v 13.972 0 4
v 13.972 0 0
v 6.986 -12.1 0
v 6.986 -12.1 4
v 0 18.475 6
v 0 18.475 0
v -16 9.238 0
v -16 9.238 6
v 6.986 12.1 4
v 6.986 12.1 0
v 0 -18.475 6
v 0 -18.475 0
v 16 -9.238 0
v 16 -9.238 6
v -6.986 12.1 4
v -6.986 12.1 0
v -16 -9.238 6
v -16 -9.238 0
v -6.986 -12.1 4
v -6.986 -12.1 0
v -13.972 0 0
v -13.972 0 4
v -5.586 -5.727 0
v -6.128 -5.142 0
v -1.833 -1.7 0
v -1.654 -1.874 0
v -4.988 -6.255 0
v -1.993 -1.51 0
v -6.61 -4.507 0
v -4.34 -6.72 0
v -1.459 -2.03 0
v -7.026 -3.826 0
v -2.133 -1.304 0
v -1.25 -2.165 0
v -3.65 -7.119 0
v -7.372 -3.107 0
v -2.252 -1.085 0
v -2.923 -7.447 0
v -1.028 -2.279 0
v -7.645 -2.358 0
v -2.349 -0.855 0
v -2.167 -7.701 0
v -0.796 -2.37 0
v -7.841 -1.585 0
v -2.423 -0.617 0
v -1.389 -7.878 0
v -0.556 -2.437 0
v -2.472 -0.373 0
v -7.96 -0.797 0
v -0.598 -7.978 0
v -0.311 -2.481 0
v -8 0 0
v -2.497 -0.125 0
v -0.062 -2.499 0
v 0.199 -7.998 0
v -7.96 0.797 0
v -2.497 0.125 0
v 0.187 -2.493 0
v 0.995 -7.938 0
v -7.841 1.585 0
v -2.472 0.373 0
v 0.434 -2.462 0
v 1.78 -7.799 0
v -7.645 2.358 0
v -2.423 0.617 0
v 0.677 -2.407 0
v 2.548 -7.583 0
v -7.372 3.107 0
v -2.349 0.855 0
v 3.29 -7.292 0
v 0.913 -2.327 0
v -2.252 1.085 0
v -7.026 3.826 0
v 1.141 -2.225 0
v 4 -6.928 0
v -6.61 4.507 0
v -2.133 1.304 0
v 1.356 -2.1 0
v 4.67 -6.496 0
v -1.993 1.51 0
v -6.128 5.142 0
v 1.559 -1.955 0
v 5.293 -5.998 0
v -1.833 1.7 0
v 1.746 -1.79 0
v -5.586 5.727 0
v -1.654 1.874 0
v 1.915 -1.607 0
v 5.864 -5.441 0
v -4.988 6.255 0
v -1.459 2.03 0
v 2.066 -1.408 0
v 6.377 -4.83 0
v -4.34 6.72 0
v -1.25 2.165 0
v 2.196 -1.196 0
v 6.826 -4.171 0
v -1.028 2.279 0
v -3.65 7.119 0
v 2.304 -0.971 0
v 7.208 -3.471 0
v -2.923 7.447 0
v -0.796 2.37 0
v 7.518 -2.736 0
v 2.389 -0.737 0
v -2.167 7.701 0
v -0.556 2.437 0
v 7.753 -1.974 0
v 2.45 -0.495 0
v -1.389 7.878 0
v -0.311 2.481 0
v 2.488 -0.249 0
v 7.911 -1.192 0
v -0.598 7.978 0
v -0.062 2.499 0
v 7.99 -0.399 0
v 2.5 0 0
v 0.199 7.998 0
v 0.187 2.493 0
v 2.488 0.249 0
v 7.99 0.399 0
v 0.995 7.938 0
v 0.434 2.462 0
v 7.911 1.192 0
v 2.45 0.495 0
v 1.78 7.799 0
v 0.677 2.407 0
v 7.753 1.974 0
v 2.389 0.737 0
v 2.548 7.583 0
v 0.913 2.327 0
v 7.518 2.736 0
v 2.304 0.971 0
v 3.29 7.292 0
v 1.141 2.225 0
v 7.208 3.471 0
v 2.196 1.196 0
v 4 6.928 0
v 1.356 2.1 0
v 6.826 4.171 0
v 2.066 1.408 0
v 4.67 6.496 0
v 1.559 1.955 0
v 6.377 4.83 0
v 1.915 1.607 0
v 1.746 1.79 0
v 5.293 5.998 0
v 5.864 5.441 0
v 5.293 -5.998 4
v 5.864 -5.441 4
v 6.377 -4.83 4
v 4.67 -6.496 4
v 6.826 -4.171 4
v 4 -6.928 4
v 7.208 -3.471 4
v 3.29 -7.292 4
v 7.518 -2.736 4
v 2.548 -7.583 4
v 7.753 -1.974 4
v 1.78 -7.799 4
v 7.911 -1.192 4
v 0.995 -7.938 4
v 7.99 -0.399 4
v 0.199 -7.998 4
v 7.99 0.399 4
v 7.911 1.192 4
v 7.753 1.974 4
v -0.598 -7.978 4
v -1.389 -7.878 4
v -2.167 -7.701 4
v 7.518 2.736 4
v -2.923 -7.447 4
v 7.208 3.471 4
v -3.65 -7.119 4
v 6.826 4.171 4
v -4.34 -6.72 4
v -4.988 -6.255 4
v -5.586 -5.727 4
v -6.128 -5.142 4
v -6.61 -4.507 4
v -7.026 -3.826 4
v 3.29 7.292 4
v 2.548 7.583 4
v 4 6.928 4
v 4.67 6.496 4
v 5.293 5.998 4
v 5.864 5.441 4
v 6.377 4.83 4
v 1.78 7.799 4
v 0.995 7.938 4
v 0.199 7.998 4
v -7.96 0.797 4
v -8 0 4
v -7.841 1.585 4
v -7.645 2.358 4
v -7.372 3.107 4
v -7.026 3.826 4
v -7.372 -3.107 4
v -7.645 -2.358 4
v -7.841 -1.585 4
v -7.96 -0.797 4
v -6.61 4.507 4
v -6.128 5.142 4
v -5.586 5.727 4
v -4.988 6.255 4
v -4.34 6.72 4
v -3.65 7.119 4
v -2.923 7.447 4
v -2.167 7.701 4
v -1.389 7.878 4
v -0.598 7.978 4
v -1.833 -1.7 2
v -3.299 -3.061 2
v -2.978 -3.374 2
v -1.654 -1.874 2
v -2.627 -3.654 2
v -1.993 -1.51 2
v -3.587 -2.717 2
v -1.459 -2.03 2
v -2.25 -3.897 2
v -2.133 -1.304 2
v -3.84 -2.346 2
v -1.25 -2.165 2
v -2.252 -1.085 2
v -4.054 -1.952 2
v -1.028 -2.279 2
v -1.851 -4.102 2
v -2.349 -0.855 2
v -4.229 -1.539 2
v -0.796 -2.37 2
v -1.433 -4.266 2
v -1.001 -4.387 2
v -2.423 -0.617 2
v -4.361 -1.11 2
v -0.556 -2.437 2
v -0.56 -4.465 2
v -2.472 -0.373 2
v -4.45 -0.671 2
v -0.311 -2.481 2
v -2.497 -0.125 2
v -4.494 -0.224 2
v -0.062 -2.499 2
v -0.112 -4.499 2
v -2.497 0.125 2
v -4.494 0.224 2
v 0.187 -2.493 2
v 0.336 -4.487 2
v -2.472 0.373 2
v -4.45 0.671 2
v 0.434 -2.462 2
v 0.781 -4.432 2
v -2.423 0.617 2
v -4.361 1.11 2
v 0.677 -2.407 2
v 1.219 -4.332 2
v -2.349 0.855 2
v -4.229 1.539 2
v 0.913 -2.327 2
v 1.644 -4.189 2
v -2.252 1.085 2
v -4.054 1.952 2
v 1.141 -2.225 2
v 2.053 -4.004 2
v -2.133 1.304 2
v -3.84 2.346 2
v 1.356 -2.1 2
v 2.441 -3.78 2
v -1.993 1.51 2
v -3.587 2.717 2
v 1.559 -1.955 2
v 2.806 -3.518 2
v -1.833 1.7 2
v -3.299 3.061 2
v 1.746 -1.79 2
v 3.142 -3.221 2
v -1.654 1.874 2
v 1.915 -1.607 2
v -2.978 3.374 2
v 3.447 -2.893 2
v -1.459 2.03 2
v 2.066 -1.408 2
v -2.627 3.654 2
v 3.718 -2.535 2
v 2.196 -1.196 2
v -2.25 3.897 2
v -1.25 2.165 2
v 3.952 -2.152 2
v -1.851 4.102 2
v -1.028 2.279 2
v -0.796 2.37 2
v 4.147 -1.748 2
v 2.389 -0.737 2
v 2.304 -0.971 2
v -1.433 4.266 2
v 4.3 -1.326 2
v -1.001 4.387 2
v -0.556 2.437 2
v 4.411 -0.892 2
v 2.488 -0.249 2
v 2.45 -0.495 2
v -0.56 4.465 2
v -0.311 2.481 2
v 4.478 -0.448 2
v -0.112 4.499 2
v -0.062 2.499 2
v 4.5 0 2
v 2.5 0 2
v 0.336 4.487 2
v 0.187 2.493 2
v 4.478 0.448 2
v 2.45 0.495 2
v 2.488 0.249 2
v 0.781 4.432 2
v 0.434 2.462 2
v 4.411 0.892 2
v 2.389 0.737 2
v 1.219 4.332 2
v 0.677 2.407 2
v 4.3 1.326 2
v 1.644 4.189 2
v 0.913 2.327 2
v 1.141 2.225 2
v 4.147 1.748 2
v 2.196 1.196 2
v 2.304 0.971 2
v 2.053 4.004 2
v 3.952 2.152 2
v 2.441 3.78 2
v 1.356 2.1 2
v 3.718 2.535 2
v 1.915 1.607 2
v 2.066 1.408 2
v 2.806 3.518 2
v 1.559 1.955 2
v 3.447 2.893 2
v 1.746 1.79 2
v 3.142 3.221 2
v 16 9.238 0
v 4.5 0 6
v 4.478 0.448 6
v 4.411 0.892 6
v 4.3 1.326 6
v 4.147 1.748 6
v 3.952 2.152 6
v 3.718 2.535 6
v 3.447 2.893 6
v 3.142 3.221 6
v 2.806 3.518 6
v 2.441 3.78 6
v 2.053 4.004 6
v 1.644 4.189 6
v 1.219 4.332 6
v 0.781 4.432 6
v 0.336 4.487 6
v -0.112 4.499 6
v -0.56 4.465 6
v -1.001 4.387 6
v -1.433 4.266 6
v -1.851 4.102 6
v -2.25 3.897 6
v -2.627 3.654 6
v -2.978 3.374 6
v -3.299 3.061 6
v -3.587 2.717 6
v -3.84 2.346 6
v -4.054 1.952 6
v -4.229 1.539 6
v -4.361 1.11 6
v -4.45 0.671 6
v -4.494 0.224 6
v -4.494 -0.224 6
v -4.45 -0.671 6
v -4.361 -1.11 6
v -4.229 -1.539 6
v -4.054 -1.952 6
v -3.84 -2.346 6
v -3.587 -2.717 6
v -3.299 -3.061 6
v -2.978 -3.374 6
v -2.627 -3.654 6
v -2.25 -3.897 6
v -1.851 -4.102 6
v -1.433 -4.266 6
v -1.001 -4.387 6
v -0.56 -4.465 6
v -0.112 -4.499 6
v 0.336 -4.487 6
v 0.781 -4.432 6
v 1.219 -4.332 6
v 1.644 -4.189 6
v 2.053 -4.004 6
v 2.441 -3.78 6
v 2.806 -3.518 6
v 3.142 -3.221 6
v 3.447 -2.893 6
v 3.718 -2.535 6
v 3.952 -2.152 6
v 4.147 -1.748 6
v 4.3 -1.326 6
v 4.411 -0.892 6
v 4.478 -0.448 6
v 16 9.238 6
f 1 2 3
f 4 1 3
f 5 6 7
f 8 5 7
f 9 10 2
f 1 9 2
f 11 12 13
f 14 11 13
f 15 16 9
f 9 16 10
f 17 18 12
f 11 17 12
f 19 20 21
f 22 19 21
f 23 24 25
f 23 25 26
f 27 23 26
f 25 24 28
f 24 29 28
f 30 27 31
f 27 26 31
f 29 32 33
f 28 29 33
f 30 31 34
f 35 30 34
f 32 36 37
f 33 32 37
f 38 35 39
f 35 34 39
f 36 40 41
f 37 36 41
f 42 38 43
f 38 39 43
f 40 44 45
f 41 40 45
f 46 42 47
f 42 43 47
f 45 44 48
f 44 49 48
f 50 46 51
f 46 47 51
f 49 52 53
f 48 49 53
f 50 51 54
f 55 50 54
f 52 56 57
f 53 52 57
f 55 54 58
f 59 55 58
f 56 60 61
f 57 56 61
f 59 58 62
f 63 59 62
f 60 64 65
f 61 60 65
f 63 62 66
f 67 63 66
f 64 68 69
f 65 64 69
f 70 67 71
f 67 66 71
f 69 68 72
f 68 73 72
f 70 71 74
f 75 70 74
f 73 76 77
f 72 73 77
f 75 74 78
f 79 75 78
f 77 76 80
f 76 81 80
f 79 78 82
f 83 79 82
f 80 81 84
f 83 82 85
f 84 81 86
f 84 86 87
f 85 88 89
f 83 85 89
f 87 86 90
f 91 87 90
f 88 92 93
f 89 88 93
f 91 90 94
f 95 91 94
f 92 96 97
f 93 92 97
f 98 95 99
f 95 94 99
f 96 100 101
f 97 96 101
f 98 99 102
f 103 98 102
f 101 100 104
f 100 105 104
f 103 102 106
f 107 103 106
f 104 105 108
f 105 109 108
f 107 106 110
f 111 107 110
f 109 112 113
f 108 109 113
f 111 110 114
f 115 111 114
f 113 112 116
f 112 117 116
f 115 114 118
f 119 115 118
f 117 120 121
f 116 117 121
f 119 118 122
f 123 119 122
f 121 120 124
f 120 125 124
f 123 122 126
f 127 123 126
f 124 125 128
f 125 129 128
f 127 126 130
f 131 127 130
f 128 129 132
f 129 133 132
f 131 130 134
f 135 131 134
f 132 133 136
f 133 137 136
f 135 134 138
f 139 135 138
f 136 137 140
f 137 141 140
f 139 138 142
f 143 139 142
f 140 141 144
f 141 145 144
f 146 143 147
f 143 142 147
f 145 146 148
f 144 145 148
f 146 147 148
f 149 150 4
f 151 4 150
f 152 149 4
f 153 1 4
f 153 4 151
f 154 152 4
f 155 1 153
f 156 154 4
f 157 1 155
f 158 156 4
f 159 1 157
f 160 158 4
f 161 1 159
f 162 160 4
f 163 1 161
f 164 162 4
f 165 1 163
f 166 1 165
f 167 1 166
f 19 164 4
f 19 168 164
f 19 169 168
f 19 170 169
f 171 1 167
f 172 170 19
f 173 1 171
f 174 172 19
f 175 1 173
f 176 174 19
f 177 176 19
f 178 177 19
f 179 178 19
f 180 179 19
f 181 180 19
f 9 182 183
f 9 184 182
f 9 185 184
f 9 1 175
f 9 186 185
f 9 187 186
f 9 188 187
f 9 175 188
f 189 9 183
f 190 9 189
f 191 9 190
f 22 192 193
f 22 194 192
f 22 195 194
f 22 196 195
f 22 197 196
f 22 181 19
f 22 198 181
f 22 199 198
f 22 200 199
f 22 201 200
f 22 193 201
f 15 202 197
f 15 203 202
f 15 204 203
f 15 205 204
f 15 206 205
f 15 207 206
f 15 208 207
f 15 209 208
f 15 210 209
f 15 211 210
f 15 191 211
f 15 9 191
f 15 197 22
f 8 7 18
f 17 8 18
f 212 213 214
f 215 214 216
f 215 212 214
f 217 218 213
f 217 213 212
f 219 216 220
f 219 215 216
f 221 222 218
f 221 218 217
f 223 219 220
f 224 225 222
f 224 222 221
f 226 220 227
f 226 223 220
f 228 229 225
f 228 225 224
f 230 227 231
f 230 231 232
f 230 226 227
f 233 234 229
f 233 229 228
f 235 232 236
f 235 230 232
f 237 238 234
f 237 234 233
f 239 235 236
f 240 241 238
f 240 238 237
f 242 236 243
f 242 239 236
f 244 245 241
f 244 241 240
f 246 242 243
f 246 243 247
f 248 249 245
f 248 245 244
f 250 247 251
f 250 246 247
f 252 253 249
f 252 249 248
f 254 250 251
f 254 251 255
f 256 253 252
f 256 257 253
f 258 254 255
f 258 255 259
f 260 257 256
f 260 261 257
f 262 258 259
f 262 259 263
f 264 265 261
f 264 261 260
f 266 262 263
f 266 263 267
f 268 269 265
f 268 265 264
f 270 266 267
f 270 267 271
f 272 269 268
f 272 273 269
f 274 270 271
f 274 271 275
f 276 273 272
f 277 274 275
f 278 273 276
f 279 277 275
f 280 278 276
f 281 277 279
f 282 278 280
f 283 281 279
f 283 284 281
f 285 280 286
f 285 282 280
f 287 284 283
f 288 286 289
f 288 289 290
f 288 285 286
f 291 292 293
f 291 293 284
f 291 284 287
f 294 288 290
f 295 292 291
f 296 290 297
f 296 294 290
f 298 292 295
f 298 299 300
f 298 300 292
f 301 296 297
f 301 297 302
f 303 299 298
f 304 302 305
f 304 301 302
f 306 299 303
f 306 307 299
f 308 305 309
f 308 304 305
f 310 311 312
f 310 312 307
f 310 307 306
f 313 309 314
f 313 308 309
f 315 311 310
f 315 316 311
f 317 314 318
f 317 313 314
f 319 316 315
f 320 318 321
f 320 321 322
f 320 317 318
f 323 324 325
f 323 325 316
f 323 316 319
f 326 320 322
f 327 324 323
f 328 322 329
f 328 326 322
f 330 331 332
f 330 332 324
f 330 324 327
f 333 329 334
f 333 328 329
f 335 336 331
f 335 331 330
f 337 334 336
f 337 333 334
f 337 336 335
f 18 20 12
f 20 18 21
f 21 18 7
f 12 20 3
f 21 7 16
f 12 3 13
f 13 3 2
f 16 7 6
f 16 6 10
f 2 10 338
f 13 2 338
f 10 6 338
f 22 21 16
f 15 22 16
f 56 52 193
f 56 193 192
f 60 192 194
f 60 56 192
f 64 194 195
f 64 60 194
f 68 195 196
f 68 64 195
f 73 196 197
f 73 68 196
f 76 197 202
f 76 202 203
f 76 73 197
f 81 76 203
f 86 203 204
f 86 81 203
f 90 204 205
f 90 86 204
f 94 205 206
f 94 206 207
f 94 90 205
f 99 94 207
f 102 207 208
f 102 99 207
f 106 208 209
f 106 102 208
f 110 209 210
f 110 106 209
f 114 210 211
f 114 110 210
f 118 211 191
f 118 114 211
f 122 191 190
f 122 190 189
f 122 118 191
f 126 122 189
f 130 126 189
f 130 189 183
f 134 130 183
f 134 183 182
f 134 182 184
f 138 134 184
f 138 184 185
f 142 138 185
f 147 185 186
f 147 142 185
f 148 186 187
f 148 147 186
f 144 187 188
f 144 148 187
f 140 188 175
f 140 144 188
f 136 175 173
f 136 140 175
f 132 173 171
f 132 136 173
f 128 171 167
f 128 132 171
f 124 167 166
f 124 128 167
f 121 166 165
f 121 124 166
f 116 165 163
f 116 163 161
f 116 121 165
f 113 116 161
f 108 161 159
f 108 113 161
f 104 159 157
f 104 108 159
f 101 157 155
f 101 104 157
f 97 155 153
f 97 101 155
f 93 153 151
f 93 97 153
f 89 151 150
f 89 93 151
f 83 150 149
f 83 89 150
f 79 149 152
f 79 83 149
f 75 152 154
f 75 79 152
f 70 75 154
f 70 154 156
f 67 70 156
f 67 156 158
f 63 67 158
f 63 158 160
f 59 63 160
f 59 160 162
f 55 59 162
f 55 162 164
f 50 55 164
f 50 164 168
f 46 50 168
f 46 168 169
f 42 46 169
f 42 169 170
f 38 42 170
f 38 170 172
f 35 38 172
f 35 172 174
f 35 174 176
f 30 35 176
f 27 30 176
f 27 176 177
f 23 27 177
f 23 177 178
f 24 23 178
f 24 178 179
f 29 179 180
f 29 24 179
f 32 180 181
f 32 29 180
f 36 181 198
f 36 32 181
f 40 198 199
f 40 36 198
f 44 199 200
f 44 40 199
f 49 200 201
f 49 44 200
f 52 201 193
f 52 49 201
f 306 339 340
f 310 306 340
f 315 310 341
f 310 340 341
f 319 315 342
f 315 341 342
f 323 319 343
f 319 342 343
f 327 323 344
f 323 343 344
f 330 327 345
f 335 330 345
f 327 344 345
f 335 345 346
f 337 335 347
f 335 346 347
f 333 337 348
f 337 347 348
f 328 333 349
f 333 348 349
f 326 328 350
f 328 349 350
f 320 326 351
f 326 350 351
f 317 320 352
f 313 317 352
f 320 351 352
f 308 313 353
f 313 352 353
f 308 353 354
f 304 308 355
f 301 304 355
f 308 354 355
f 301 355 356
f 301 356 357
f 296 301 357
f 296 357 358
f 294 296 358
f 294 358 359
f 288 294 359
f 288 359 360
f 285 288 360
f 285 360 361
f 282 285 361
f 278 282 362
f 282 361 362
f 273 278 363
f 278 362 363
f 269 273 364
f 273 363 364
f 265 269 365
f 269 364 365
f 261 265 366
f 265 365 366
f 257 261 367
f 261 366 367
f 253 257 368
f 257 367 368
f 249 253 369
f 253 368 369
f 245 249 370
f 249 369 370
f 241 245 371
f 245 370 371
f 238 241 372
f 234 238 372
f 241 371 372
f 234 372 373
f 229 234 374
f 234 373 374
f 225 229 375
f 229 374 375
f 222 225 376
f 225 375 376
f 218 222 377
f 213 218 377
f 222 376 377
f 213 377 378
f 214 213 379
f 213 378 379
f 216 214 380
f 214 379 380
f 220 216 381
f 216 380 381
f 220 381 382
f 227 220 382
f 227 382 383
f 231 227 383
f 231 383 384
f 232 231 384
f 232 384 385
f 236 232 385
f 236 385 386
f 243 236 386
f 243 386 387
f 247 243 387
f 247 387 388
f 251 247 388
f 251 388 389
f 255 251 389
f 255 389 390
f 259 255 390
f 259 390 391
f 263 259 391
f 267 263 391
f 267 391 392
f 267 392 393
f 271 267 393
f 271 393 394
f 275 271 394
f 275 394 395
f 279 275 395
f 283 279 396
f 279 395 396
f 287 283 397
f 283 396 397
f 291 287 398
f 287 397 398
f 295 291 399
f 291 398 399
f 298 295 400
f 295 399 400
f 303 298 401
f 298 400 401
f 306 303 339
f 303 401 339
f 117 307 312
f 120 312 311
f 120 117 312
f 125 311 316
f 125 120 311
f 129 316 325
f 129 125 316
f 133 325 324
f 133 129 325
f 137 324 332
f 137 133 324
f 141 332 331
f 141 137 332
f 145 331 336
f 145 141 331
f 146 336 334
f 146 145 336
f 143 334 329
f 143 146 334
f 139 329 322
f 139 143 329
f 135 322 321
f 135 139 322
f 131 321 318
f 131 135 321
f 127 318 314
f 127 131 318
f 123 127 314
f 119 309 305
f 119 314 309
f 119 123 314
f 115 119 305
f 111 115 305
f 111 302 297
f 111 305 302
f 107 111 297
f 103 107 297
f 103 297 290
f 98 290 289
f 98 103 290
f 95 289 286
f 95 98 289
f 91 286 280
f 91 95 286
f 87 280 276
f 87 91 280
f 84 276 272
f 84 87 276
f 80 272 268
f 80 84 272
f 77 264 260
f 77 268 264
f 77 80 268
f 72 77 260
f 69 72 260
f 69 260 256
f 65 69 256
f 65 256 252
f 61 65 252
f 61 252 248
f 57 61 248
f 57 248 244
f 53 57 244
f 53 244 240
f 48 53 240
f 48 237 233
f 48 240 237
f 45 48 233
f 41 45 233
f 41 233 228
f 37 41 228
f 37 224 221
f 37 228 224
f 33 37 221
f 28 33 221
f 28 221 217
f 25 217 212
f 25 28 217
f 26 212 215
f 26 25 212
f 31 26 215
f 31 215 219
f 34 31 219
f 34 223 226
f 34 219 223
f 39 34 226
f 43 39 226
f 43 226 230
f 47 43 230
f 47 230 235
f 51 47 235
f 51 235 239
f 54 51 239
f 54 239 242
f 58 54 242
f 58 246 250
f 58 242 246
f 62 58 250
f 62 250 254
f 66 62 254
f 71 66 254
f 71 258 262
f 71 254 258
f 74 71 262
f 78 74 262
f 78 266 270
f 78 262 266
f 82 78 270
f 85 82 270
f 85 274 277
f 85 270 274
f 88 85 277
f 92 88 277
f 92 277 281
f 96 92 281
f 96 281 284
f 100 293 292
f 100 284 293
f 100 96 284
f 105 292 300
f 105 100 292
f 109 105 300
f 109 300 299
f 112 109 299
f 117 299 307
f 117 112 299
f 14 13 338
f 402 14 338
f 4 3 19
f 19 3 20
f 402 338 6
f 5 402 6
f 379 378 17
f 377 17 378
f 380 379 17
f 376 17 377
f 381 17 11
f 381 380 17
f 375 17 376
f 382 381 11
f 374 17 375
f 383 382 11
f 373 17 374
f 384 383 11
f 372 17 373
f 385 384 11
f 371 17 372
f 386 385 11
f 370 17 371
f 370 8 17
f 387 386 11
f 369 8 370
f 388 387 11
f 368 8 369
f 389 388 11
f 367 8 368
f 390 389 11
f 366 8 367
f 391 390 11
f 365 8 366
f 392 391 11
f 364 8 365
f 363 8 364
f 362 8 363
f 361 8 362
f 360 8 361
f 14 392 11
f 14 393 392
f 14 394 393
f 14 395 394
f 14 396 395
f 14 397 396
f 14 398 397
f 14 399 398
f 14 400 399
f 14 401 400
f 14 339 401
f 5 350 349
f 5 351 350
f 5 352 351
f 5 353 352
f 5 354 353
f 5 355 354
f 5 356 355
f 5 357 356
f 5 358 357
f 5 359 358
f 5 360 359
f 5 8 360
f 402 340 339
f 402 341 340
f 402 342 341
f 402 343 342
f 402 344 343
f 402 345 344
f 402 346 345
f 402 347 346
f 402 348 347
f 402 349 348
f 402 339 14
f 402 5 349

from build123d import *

# Parameters (mm, degrees)
SKIZZE1_R                       = 2.5
AUFSATZ_LINEAR_AUSTRAGEN1_DEPTH = 6
SKIZZE2_R                       = 4.5
SCHNITT_LINEAR_AUSTRAGEN1_DEPTH = 4
SKIZZE3_R                       = 8
SCHNITT_LINEAR_AUSTRAGEN2_DEPTH = 4


with BuildPart() as part:
    # Skizze1 → Aufsatz-Linear austragen1 (new body)
    with BuildSketch(Plane.XY):
        Polygon((16, 9.237604307), (0, 18.475208614), (-16, 9.237604307), (-16, -9.237604307), (0, -18.475208614), (16, -9.237604307), align=None)
        Circle(SKIZZE1_R, mode=Mode.SUBTRACT)
    extrude(amount=AUFSATZ_LINEAR_AUSTRAGEN1_DEPTH)

    # Skizze2 → Schnitt-Linear austragen1 (cut)
    with BuildSketch(Plane.XY.offset(6)):
        Circle(SKIZZE2_R)
    extrude(amount=-SCHNITT_LINEAR_AUSTRAGEN1_DEPTH, mode=Mode.SUBTRACT)

    # Skizze3 → Schnitt-Linear austragen2 (cut)
    with BuildSketch(Plane(origin=(0, 0, 0), x_dir=(-1, 0, 0), z_dir=(0, 0, -1))):
        Polygon((13.971876514, 0), (6.985938257, 12.1), (-6.985938257, 12.1), (-13.971876514, 0), (-6.985938257, -12.1), (6.985938257, -12.1), align=None)
        Circle(SKIZZE3_R, mode=Mode.SUBTRACT)
    extrude(amount=-SCHNITT_LINEAR_AUSTRAGEN2_DEPTH, mode=Mode.SUBTRACT)


solid = part.part
